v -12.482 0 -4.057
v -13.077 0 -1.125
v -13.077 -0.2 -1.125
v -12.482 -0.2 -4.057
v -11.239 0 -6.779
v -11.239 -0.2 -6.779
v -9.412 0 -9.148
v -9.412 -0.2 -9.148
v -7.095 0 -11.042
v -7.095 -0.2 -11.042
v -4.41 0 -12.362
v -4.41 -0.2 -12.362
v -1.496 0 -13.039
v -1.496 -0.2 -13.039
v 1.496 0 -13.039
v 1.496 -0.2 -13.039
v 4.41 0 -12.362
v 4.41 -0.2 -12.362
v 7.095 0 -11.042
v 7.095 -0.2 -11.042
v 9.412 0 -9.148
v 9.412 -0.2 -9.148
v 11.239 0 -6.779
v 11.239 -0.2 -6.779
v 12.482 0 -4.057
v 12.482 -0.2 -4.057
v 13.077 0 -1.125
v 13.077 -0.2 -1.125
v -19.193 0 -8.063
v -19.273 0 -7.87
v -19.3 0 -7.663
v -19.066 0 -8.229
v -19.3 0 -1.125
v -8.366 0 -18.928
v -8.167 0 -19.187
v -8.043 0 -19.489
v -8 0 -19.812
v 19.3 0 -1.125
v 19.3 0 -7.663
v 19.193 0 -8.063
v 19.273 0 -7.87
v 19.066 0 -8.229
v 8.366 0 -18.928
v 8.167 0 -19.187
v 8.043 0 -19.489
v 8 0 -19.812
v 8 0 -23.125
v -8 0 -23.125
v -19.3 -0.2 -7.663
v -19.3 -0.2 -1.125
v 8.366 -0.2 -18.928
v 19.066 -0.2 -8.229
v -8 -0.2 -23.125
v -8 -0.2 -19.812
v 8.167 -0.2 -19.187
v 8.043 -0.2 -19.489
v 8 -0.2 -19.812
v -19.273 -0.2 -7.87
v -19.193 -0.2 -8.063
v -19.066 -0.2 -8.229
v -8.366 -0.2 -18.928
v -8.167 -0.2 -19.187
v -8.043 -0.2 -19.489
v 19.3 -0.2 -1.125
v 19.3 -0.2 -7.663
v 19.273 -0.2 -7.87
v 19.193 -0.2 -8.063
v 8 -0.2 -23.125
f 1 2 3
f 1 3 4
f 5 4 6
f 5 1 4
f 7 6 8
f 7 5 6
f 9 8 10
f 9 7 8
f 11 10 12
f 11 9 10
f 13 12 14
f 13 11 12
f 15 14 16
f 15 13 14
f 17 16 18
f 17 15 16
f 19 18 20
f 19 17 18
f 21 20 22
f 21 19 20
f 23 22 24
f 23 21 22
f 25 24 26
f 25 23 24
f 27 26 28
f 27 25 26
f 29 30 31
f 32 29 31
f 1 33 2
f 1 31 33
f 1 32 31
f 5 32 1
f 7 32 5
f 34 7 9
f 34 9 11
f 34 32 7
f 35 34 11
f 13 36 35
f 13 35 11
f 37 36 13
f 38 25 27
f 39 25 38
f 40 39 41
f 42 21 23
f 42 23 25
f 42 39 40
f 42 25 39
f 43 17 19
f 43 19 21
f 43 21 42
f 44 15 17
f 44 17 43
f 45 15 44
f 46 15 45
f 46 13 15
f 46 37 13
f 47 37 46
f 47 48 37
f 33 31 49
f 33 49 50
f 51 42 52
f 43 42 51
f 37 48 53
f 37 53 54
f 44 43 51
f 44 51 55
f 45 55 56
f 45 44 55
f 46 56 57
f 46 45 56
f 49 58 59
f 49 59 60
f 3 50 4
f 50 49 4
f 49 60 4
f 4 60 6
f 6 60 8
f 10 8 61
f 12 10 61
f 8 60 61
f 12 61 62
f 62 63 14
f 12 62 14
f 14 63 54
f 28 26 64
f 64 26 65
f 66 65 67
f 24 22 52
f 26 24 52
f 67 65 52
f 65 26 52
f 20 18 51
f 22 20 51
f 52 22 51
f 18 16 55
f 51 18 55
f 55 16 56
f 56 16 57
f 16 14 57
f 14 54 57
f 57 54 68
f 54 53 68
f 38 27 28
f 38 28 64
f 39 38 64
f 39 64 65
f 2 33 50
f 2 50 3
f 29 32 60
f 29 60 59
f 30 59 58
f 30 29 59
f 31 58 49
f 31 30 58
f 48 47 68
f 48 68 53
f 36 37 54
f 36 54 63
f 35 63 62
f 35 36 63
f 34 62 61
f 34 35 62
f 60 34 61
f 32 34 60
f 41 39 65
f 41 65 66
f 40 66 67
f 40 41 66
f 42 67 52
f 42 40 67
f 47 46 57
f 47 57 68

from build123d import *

# Parameters (mm, degrees)
BOSS_EXTRUDE1_DEPTH = 0.2


with BuildPart() as part:
    # Sketch1 → Boss-Extrude1 (new body)
    with BuildSketch(Plane(origin=(0, 0, 0), x_dir=(1, 0, 0), z_dir=(0, 1, 0))):
        with BuildLine():
            Line((-19.3, 1.125), (-13.076696831, 1.125))
            ThreePointArc((-13.076696831, 1.125), (0, 13.125), (13.076696831, 1.125))
            Line((13.076696831, 1.125), (19.3, 1.125))
            Line((19.3, 1.125), (19.3, 7.662950904))
            ThreePointArc((19.3, 7.662950904), (19.239103626, 7.969097649), (19.065685426, 8.228636327))
            Line((19.065685426, 8.228636327), (8.366116524, 18.928205229))
            ThreePointArc((8.366116524, 18.928205229), (8.095150585, 19.333734415), (8, 19.812088706))
            Line((8, 19.812088706), (8, 23.124999999))
            Line((8, 23.124999999), (-8, 23.124999999))
            Line((-8, 23.124999999), (-8, 19.812088706))
            ThreePointArc((-8, 19.812088706), (-8.095150585, 19.333734415), (-8.366116524, 18.928205229))
            Line((-8.366116524, 18.928205229), (-19.065685426, 8.228636327))
            ThreePointArc((-19.065685426, 8.228636327), (-19.239103626, 7.969097649), (-19.3, 7.662950904))
            Line((-19.3, 7.662950904), (-19.3, 1.125))
        make_face()
    extrude(amount=-BOSS_EXTRUDE1_DEPTH)


solid = part.part
